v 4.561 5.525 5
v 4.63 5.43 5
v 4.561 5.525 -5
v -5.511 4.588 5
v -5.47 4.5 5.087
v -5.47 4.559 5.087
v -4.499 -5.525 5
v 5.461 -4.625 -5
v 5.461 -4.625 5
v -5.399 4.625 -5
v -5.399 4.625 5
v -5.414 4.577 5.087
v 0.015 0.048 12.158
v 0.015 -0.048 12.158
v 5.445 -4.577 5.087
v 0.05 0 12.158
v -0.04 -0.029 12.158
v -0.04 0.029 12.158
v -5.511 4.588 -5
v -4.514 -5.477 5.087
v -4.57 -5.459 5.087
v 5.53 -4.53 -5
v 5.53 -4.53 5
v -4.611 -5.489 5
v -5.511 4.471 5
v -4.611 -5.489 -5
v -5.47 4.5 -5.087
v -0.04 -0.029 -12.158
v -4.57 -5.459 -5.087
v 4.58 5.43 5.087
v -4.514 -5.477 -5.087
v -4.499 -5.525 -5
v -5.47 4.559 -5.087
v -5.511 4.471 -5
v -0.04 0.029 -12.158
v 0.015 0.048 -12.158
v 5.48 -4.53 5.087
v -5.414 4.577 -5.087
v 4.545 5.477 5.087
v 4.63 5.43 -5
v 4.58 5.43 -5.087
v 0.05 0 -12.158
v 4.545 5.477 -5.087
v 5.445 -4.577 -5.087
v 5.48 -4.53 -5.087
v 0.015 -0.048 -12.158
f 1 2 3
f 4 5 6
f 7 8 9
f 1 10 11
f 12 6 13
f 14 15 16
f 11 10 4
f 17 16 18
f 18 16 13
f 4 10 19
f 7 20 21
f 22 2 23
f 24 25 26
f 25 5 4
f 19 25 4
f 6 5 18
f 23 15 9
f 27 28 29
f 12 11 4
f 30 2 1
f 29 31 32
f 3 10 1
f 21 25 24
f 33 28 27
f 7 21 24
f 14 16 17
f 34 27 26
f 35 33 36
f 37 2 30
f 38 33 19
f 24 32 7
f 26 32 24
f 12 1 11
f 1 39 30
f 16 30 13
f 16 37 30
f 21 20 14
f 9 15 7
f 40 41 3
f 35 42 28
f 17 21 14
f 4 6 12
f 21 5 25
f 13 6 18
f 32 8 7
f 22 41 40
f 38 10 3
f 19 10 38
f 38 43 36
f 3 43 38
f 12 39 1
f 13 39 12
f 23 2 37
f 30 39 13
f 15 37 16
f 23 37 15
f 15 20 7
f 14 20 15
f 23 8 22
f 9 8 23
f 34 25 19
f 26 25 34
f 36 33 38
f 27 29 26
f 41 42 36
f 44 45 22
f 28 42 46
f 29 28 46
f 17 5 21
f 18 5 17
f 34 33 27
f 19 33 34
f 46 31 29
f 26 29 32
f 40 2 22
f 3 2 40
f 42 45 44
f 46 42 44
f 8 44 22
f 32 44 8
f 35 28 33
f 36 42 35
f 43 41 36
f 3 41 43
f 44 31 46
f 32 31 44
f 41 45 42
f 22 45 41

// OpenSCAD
// Auto-generated OpenSCAD file

    inner_points = 10*[[0.5429769689115526, -0.4529635870924383, 0.49999999999997413], [0.5429769689115337, -0.4529635870924037, -0.500000000000026], [-0.4529635870924116, -0.5429769689115604, 0.49999999999998984], [-0.4529635870924304, -0.5429769689115258, -0.5000000000000102], [0.4529635870924304, 0.5429769689115258, 0.5000000000000102], [0.4529635870924116, 0.5429769689115604, -0.49999999999998984], [-0.5429769689115337, 0.4529635870924037, 0.500000000000026], [-0.5429769689115526, 0.4529635870924383, -0.49999999999997413], [2.2755059616728634e-14, -4.168991678798836e-14, 1.2071067811865475], [-2.2755059616728634e-14, 4.168991678798836e-14, -1.2071067811865475]];

    outer_points = 10*[[-0.039354312458118546, -0.43916949600833827, 0.7453733238228553], [0.04209249648260477, 0.5541932458770876, 0.6641521421813528], [0.6640328188038629, -0.5541932458770876, 0.04393474451517876], [0.7454796277445863, 0.43916949600833827, -0.03728643712632368], [-0.7454796277445863, -0.43916949600833827, 0.03728643712632368], [-0.6640328188038629, 0.5541932458770876, -0.04393474451517876], [-0.04209249648260477, -0.5541932458770876, -0.6641521421813528], [0.039354312458118546, 0.43916949600833827, -0.7453733238228553], [-0.09831499537835225, -1.1990949019079598, 0.09804263913544194], [0.09831499537835225, 1.1990949019079598, -0.09804263913544194]];

    // Convex hull for inner set (I)
    module inner_hull() {
        hull() {
            for (p = inner_points) {
                translate(p) sphere(r=0.1);
            }
        }
    }

    // Convex hull for outer set (O) minus inner hull (O \ I)
    module outer_minus_inner() {
        difference() {
            hull() {
                for (p = outer_points) {
                    translate(p) sphere(r=0.1);
                }
            }
            inner_hull(); // Subtract inner hull
        }
    }

    // Convex hull for outer set (O) minus all translated inner hulls
    module outer_minus_AllTranslationInner() {
        difference() {
            hull() {
                for (p = outer_points) {
                    translate(p) sphere(r=0.1);
                }
            }
            hull() {
                translate([0,0,50]) inner_hull();
                translate([0,0,-50]) inner_hull();
            }; // Subtract translated inner hulls
        }
    }

    // Difference between outer_minus_inner and outer_minus_AllTranslationInner
    module outer_minus_inner_diff() {
        difference() {
            // Outer minus inner
            difference() {
                hull() {
                    for (p = outer_points) {
                        translate(p) sphere(r=0.1);
                    }
                }
                inner_hull();
            }

            // Subtract Outer minus AllTranslationInner
            difference() {
                hull() {
                    for (p = outer_points) {
                        translate(p) sphere(r=0.1);
                    }
                }
                hull() {
                    translate([0,0,50]) inner_hull();
                    translate([0,0,-50]) inner_hull();
                };
            }
        }
    }

    // Rendering all with colors applied
    color([1, 0, 0, 0.5]) inner_hull(); // Transparent red
    
